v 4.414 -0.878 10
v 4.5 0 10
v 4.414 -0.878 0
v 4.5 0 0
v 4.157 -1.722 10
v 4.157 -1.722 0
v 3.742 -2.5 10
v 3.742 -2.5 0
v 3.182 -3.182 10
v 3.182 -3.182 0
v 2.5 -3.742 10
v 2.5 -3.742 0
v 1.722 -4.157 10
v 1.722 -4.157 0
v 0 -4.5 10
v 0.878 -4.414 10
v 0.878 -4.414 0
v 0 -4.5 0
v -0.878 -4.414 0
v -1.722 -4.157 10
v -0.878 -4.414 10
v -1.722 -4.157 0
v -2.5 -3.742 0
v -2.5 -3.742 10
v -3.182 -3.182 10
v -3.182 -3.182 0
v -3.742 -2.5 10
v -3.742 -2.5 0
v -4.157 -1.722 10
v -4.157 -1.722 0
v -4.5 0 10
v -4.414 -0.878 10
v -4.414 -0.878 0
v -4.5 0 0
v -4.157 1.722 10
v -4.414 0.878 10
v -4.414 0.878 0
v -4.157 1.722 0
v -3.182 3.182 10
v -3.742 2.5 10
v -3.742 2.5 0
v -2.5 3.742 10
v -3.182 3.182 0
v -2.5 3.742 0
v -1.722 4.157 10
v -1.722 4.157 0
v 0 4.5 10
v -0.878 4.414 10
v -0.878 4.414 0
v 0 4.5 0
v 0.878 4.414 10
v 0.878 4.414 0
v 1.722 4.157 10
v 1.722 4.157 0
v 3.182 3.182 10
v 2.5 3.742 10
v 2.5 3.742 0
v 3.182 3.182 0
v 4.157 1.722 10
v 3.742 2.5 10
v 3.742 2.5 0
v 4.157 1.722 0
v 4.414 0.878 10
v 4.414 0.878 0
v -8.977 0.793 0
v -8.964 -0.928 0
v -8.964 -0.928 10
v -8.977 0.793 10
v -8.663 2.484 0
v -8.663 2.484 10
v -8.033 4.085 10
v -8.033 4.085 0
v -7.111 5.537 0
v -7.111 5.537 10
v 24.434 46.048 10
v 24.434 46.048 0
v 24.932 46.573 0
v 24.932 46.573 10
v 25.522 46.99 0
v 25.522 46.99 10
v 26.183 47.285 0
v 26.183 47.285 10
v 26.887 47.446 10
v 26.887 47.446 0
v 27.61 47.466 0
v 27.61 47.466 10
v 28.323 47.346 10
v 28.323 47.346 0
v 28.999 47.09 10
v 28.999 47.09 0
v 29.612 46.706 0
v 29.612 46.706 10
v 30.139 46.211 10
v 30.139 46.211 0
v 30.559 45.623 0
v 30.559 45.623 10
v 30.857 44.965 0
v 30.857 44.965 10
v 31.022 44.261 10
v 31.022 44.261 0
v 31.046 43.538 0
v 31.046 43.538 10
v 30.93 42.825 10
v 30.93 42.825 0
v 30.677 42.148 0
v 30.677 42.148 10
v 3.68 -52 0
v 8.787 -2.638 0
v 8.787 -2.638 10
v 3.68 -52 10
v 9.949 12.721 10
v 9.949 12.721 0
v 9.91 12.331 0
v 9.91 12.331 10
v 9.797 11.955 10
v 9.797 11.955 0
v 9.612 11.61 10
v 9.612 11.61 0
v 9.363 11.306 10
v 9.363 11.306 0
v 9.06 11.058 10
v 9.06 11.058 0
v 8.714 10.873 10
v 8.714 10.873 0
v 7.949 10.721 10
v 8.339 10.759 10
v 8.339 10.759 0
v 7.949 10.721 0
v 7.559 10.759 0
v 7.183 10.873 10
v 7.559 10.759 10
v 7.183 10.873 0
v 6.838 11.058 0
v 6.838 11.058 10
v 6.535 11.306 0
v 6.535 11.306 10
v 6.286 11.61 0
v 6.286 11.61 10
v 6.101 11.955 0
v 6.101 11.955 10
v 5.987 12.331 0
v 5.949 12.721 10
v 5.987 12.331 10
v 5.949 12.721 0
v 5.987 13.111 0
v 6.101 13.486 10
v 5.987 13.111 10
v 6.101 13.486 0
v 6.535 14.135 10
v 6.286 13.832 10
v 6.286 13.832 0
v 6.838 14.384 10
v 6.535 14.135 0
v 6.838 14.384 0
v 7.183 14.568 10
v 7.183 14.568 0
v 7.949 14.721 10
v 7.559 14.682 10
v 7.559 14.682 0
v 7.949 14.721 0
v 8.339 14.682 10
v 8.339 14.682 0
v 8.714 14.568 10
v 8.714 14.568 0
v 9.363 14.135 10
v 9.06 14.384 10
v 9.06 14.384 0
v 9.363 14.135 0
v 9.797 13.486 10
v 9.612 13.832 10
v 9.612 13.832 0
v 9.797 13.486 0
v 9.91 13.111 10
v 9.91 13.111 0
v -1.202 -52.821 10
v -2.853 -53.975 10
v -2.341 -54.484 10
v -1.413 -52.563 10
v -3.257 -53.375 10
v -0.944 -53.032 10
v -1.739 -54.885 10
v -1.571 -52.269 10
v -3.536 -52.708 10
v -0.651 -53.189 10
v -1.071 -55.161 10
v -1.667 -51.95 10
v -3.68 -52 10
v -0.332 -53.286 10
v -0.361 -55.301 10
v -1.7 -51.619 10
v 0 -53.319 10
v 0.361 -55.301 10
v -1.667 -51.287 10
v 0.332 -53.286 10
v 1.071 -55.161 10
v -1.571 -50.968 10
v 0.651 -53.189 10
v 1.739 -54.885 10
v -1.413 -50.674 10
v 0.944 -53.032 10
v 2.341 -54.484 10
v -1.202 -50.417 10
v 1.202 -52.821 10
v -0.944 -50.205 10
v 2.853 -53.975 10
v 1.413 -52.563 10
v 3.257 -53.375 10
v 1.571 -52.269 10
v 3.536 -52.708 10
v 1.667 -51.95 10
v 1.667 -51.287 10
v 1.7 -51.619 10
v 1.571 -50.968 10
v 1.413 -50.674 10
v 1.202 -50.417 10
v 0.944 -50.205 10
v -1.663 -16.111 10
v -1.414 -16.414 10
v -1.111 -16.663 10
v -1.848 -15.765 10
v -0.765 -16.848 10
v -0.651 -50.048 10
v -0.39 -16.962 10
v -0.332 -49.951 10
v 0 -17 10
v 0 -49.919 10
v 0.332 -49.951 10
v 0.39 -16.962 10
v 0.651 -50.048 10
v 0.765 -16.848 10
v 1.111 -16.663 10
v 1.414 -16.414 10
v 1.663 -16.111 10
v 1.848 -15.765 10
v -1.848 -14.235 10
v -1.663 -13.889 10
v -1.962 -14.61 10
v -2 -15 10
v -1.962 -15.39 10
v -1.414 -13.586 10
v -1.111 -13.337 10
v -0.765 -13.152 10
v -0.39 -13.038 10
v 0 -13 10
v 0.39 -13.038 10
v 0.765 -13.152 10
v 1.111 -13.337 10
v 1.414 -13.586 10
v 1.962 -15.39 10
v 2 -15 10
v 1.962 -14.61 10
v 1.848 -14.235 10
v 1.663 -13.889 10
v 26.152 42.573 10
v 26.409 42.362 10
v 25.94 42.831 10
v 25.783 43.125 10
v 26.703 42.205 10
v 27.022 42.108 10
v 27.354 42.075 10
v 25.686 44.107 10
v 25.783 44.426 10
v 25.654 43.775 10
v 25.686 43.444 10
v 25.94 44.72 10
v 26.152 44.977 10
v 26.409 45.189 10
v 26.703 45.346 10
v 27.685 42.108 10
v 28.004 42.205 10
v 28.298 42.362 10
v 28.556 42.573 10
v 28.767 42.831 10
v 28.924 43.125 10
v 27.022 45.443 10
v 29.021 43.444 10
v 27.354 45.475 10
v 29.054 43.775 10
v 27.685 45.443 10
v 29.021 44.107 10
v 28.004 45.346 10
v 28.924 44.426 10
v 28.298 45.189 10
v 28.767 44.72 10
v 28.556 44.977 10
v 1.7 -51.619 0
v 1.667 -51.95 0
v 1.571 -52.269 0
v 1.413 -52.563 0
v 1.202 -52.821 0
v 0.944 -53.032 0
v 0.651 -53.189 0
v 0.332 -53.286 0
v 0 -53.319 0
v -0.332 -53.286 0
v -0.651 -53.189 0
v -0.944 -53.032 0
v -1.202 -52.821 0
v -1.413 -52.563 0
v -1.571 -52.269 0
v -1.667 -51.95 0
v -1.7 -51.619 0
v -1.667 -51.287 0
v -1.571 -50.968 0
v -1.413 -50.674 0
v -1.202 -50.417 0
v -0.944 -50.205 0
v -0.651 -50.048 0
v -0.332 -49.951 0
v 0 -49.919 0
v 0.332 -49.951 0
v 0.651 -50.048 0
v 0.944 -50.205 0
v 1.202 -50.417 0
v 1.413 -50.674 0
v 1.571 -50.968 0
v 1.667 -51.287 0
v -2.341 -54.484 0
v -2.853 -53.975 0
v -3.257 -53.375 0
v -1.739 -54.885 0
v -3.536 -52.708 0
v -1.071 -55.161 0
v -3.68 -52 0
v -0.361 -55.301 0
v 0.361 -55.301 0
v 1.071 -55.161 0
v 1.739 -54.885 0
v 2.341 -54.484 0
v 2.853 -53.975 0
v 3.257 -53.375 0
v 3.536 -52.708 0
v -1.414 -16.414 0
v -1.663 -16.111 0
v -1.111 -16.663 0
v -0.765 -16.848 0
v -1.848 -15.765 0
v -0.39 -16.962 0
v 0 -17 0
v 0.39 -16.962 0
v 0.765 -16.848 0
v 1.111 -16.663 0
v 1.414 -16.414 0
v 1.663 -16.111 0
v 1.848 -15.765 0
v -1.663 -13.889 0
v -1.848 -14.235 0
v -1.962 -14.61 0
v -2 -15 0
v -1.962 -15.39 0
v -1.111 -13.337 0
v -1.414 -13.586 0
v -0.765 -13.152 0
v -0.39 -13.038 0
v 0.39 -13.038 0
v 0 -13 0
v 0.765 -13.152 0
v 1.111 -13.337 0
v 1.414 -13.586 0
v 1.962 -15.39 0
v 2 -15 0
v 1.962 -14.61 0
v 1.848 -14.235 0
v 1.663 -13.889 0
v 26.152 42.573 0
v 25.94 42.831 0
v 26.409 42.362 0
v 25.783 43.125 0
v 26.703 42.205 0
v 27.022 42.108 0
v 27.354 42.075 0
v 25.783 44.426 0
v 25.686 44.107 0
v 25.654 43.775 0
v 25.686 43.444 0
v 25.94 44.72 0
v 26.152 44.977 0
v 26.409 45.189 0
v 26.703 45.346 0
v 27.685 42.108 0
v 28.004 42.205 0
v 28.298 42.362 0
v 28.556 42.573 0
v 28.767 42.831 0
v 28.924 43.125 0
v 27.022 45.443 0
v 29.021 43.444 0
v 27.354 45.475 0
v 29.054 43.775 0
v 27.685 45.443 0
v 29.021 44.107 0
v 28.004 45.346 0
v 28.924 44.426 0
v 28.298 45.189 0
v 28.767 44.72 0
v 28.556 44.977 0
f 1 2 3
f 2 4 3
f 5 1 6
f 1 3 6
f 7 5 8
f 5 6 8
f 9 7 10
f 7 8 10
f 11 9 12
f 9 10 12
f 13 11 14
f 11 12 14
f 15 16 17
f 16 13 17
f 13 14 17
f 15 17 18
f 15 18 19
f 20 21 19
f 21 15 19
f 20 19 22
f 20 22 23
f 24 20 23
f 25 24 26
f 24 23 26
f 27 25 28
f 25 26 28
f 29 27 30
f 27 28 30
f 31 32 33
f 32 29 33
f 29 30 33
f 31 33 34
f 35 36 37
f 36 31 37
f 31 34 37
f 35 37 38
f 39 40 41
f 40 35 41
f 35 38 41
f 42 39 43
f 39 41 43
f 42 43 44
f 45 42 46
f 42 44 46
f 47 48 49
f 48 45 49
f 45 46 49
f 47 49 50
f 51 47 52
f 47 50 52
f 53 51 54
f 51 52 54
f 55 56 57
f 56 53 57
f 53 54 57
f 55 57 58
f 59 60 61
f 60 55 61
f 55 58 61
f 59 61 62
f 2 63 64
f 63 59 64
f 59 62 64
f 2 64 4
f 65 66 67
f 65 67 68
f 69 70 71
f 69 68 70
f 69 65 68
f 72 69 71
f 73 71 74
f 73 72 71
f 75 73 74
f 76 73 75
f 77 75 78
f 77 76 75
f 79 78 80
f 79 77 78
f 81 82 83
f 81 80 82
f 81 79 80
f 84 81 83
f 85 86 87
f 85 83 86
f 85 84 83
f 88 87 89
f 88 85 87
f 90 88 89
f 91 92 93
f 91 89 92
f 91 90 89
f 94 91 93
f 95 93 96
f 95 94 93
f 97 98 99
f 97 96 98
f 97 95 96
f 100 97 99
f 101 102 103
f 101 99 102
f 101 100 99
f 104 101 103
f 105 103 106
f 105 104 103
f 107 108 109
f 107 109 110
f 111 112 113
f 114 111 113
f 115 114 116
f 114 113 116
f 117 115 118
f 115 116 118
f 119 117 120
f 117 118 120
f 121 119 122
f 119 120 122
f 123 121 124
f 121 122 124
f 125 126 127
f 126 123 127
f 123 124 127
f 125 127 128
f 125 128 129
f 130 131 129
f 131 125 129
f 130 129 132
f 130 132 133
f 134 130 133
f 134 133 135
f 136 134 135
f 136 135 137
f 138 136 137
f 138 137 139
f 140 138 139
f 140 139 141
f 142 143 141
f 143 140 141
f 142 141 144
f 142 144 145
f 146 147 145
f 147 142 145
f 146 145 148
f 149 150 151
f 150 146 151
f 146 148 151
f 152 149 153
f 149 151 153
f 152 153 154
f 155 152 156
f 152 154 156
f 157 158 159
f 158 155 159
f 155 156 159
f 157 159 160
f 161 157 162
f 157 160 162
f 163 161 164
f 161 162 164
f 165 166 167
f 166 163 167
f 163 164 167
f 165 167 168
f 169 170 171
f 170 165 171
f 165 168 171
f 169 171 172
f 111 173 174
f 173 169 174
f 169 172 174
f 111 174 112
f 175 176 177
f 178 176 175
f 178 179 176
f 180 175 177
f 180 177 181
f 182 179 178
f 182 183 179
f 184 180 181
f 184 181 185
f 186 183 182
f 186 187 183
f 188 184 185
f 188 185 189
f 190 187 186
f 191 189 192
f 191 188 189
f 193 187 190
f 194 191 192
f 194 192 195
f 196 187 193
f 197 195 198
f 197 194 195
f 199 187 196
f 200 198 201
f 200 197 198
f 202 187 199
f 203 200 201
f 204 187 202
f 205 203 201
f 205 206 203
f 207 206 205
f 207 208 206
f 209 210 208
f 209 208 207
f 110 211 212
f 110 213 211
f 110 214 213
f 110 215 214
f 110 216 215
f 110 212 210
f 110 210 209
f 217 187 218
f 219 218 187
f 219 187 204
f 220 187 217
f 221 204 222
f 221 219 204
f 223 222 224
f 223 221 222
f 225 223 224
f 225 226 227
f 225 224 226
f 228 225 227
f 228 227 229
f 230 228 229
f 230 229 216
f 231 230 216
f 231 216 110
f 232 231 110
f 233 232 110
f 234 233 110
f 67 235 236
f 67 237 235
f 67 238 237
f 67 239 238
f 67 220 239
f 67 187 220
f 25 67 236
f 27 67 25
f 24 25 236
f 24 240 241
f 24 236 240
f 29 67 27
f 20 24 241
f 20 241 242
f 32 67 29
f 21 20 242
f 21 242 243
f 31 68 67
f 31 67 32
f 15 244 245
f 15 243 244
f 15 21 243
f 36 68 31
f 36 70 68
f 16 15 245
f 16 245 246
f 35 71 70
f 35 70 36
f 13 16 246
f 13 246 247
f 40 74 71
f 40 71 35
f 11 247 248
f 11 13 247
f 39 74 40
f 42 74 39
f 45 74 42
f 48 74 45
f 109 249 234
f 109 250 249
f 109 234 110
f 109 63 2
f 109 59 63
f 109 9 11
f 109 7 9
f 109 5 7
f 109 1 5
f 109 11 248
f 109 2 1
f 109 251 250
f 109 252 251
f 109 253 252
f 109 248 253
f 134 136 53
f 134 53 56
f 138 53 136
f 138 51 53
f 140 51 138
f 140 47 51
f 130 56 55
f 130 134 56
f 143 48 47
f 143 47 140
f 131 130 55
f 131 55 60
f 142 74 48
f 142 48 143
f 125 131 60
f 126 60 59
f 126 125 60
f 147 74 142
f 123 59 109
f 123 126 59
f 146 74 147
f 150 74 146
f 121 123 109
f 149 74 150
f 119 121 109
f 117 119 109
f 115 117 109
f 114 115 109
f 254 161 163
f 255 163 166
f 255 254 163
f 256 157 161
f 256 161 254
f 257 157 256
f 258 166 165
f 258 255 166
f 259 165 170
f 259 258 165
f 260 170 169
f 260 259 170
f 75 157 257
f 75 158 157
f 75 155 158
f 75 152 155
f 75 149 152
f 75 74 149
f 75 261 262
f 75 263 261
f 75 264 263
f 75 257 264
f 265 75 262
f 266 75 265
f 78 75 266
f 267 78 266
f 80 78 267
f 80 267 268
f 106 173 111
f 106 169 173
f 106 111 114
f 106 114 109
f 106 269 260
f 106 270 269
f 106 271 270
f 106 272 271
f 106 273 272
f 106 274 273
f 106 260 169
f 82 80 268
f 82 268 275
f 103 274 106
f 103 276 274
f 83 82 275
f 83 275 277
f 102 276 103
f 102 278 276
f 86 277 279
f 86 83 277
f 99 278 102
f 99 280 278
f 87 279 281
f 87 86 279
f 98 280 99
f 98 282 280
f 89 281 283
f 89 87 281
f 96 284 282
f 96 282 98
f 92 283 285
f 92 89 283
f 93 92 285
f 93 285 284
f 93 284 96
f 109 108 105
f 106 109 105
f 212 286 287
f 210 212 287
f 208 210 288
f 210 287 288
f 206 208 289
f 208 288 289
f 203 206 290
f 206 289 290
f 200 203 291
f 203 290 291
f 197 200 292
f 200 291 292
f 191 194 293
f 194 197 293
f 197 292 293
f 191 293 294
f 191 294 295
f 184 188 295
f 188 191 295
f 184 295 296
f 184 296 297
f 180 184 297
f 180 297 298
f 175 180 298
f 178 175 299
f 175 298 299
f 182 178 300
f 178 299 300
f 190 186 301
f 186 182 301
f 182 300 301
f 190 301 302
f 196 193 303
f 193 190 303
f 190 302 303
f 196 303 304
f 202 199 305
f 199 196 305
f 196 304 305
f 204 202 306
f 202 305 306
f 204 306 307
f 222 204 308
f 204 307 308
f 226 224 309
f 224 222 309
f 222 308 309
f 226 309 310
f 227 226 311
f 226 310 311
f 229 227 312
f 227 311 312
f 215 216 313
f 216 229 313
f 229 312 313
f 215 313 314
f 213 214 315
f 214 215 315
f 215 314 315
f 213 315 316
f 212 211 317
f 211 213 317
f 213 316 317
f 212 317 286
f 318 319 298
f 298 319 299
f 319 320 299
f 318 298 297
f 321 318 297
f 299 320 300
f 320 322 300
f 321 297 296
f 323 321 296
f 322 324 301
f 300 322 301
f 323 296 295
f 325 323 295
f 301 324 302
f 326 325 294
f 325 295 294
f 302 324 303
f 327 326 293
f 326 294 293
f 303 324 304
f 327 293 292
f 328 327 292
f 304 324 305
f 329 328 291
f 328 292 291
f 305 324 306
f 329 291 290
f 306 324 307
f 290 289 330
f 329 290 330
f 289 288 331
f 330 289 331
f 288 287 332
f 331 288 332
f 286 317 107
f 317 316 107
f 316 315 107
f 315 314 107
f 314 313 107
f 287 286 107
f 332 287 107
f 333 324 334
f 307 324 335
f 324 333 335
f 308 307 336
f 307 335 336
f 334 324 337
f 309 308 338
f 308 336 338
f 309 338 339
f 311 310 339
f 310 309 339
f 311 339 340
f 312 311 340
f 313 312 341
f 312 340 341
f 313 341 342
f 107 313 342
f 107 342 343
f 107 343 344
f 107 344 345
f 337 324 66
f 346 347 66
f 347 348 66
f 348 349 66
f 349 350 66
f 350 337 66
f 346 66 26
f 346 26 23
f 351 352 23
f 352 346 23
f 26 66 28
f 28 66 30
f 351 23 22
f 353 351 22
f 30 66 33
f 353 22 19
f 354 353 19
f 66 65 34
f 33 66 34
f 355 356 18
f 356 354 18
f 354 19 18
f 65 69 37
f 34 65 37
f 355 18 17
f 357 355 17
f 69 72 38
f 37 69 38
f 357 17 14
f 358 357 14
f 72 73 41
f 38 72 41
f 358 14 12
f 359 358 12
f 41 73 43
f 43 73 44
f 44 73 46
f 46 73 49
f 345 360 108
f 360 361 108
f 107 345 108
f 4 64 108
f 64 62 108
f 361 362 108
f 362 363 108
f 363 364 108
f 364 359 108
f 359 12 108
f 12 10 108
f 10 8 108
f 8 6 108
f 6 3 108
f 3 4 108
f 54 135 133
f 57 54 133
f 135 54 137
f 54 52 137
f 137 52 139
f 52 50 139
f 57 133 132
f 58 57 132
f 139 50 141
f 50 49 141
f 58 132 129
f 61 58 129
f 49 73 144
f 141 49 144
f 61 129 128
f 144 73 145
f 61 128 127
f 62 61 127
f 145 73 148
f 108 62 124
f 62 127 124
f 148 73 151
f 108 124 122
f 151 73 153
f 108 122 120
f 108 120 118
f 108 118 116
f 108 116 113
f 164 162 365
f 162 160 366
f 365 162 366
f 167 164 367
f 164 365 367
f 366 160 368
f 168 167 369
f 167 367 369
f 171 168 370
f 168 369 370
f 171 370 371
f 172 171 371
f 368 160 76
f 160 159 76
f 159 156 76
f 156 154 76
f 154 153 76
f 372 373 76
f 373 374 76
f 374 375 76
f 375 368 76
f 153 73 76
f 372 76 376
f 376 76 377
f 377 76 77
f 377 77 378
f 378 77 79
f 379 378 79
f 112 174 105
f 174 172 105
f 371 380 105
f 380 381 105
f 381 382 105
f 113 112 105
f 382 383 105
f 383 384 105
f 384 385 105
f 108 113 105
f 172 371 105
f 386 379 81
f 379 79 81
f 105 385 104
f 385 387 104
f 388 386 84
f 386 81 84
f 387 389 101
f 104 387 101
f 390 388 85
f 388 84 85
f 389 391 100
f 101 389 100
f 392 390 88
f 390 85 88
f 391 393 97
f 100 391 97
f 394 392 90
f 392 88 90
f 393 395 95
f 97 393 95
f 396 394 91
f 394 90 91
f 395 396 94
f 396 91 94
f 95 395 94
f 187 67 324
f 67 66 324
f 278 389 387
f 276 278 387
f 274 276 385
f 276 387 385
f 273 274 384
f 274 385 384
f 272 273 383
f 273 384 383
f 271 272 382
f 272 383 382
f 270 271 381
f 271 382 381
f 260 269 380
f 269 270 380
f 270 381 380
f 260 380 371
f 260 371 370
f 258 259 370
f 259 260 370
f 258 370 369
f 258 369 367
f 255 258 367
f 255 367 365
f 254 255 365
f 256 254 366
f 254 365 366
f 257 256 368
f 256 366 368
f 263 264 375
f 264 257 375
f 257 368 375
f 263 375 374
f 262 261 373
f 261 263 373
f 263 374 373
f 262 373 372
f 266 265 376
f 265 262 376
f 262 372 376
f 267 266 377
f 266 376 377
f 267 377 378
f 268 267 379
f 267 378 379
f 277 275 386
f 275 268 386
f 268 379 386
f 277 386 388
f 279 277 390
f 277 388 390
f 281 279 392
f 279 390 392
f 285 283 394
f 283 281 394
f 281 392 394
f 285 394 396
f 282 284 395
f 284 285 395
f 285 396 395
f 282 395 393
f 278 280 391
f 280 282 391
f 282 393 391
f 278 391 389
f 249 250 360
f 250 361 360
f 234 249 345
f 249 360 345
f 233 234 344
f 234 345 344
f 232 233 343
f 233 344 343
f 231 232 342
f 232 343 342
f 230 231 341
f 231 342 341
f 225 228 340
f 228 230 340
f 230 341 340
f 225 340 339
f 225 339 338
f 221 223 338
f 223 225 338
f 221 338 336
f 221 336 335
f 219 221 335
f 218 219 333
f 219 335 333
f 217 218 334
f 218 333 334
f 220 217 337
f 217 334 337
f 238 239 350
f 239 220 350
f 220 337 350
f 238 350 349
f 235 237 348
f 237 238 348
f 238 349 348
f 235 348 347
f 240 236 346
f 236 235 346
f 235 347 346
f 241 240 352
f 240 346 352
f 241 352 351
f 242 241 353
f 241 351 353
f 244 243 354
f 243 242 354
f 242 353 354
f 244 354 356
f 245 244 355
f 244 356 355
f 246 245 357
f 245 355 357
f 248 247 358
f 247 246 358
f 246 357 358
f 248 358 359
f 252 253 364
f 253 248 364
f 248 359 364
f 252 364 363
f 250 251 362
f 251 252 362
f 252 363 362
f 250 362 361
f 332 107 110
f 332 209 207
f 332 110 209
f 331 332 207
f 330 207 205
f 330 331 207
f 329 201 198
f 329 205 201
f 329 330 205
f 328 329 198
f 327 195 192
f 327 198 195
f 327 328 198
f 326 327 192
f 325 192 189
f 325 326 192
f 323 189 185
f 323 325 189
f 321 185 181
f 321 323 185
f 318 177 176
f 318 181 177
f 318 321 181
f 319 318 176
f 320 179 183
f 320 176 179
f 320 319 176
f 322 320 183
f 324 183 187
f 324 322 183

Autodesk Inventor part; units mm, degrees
ref_plane "YZ Plane" through (0, 0, 0) normal (1, 0, 0) x (0, 1, 0)
ref_plane "XZ Plane" through (0, 0, 0) normal (0, 1, 0) x (-1, 0, 0)
ref_plane "XY Plane" through (0, 0, 0) normal (0, 0, 1) x (1, 0, 0)
sketch "Sketch1" plane through (0, 0, 0) normal (0, 0, 1) x (1, 0, 0)
  circle A0 centre (0, 0) radius 4.5
  line L0 (0, 0) -> (27.3538, 43.7752) construction
  line L1 (0, -76.1552) -> (0, 69.6997) construction
  line L2 (0, 0) -> (0, -51.6188) construction
  circle A1 centre (0, -51.6188) radius 1.7
  circle A2 centre (27.3538, 43.7752) radius 1.7
  arc A3 (30.6767, 42.1478) -> (24.4345, 46.0484) centre (27.3538, 43.7752) ccw
  arc A4 (-3.6804, -51.9996) -> (3.6804, -51.9996) centre (0, -51.6188) ccw
  line L3 (0, 0) -> (7.9488, 12.7207) construction
  circle A5 centre (7.9488, 12.7207) radius 2
  line L4 (0, 0) -> (0, -15) construction
  circle A6 centre (0, -15) radius 2
  line L5 (-7.1107, 5.5369) -> (24.4345, 46.0484)
  line L6 (-8.9644, -0.9275) -> (-3.6804, -51.9996)
  line L7 (8.7873, -2.6385) -> (30.6767, 42.1478)
  line L8 (8.7873, -2.6385) -> (3.6804, -51.9996)
  arc A7 (-7.1107, 5.5369) -> (-8.9644, -0.9275) centre (0, 0) ccw
  point P0 (8.0937, -3.9639)
  dimension "d0" = 9
  dimension "d2" = 32
  dimension "d3" = 51.6188
  dimension "d4" = 51.6188
  dimension "d5" = 3.4
  dimension "d6" = 3.4
  dimension "d7" = 3.7
  dimension "d8" = 3.7
  dimension "d9" = 15
  dimension "d10" = 4
  dimension "d11" = 15
  dimension "d12" = 4
extrude "Extrusion1" add sketch "Sketch1" along normal blind 10
equation "\"d3\" = d4"
properties part number "Lever" material "Steel"
